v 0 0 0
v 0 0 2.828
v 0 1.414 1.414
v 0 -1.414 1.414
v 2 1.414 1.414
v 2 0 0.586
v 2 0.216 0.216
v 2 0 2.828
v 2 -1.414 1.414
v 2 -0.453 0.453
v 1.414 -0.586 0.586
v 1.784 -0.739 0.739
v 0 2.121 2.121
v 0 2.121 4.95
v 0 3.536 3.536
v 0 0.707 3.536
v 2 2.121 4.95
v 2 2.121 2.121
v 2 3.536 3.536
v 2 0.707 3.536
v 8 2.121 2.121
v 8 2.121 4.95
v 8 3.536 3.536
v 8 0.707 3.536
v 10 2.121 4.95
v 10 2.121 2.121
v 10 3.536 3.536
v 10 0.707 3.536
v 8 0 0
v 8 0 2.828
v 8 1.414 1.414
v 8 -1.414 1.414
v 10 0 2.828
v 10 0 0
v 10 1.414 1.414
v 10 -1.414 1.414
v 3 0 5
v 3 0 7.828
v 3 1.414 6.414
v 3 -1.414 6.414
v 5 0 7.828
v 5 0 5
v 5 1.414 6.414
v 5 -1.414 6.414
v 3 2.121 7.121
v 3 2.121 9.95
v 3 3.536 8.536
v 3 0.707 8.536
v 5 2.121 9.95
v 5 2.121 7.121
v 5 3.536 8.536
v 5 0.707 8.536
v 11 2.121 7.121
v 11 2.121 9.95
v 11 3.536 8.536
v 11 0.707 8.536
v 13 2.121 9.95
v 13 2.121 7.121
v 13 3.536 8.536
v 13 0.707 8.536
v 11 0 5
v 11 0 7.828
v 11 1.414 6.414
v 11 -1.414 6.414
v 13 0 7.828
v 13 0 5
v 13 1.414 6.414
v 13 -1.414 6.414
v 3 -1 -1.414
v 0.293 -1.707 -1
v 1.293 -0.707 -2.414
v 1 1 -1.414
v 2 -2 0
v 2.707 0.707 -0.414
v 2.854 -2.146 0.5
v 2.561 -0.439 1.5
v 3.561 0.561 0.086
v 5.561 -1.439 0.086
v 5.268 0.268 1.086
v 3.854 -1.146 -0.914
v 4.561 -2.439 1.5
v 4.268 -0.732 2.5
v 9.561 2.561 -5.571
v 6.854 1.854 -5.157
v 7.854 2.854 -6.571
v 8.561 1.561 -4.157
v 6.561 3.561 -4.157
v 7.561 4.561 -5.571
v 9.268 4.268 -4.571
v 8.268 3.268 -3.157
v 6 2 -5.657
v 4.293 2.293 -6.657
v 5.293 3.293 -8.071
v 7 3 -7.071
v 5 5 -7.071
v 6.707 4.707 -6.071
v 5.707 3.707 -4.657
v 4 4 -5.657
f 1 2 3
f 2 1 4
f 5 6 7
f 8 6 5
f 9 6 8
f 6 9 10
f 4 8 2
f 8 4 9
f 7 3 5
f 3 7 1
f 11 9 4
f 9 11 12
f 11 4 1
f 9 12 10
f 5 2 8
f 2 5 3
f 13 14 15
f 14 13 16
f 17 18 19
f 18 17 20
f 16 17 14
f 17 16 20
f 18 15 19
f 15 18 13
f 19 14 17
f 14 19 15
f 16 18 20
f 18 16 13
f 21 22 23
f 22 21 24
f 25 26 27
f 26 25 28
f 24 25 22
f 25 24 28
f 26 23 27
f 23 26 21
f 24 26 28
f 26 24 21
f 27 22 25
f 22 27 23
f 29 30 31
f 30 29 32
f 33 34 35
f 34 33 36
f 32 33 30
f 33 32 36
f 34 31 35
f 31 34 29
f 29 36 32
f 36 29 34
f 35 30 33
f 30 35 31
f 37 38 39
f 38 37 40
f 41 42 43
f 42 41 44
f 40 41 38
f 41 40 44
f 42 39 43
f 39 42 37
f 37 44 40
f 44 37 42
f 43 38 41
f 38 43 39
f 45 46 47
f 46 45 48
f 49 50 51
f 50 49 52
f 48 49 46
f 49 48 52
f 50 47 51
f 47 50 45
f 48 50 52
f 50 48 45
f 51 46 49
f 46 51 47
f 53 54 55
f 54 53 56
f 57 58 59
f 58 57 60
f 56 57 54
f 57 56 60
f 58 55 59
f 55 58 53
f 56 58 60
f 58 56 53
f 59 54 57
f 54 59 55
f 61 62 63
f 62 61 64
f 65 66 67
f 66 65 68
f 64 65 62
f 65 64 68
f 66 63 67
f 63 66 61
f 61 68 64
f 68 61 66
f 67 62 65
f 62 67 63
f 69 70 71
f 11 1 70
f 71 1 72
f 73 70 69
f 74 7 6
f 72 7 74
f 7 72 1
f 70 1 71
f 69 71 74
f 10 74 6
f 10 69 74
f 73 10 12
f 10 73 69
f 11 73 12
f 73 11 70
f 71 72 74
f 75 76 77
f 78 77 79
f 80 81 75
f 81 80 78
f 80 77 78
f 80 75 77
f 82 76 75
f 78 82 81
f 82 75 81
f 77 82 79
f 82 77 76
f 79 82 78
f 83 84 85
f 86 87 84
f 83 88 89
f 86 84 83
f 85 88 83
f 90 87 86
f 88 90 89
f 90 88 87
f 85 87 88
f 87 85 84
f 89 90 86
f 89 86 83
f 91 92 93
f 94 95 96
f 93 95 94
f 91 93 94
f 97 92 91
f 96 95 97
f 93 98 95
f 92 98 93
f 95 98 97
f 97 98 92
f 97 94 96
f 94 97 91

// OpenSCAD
$fn=7;
union()
{
	union()
	{
		translate([0,0,0])
		{
			rotate(45.000004,[1,0,0])
			{
				cube([2,2,2]);
			}
		}
		translate([0,2.1213202,2.1213202])
		{
			rotate(45.000004,[1,0,0])
			{
				cube([2,2,2]);
			}
		}
		translate([8,2.1213202,2.1213202])
		{
			rotate(45.000004,[1,0,0])
			{
				cube([2,2,2]);
			}
		}
		translate([8,0,0])
		{
			rotate(45.000004,[1,0,0])
			{
				cube([2,2,2]);
			}
		}
	}
	union()
	{
		translate([3,0,5])
		{
			rotate(45.000004,[1,0,0])
			{
				cube([2,2,2]);
			}
		}
		translate([3,2.1213202,7.1213202])
		{
			rotate(45.000004,[1,0,0])
			{
				cube([2,2,2]);
			}
		}
		translate([11,2.1213202,7.1213202])
		{
			rotate(45.000004,[1,0,0])
			{
				cube([2,2,2]);
			}
		}
		translate([11,0,5])
		{
			rotate(45.000004,[1,0,0])
			{
				cube([2,2,2]);
			}
		}
	}
	union()
	{
		translate([0,0,0])
		{
			rotate(124.975296,[0.8259425,0.52084094,-0.21573941])
			{
				cube([2,2,2]);
			}
		}
		translate([2.5606596,-0.4393394,1.5000002])
		{
			rotate(124.975296,[0.8259425,0.52084094,-0.21573941])
			{
				cube([2,2,2]);
			}
		}
		translate([6.5606604,3.56066,-4.156853])
		{
			rotate(124.975296,[0.8259425,0.52084094,-0.21573941])
			{
				cube([2,2,2]);
			}
		}
		translate([4.0000005,3.9999995,-5.6568537])
		{
			rotate(124.975296,[0.8259425,0.52084094,-0.21573941])
			{
				cube([2,2,2]);
			}
		}
	}
}
